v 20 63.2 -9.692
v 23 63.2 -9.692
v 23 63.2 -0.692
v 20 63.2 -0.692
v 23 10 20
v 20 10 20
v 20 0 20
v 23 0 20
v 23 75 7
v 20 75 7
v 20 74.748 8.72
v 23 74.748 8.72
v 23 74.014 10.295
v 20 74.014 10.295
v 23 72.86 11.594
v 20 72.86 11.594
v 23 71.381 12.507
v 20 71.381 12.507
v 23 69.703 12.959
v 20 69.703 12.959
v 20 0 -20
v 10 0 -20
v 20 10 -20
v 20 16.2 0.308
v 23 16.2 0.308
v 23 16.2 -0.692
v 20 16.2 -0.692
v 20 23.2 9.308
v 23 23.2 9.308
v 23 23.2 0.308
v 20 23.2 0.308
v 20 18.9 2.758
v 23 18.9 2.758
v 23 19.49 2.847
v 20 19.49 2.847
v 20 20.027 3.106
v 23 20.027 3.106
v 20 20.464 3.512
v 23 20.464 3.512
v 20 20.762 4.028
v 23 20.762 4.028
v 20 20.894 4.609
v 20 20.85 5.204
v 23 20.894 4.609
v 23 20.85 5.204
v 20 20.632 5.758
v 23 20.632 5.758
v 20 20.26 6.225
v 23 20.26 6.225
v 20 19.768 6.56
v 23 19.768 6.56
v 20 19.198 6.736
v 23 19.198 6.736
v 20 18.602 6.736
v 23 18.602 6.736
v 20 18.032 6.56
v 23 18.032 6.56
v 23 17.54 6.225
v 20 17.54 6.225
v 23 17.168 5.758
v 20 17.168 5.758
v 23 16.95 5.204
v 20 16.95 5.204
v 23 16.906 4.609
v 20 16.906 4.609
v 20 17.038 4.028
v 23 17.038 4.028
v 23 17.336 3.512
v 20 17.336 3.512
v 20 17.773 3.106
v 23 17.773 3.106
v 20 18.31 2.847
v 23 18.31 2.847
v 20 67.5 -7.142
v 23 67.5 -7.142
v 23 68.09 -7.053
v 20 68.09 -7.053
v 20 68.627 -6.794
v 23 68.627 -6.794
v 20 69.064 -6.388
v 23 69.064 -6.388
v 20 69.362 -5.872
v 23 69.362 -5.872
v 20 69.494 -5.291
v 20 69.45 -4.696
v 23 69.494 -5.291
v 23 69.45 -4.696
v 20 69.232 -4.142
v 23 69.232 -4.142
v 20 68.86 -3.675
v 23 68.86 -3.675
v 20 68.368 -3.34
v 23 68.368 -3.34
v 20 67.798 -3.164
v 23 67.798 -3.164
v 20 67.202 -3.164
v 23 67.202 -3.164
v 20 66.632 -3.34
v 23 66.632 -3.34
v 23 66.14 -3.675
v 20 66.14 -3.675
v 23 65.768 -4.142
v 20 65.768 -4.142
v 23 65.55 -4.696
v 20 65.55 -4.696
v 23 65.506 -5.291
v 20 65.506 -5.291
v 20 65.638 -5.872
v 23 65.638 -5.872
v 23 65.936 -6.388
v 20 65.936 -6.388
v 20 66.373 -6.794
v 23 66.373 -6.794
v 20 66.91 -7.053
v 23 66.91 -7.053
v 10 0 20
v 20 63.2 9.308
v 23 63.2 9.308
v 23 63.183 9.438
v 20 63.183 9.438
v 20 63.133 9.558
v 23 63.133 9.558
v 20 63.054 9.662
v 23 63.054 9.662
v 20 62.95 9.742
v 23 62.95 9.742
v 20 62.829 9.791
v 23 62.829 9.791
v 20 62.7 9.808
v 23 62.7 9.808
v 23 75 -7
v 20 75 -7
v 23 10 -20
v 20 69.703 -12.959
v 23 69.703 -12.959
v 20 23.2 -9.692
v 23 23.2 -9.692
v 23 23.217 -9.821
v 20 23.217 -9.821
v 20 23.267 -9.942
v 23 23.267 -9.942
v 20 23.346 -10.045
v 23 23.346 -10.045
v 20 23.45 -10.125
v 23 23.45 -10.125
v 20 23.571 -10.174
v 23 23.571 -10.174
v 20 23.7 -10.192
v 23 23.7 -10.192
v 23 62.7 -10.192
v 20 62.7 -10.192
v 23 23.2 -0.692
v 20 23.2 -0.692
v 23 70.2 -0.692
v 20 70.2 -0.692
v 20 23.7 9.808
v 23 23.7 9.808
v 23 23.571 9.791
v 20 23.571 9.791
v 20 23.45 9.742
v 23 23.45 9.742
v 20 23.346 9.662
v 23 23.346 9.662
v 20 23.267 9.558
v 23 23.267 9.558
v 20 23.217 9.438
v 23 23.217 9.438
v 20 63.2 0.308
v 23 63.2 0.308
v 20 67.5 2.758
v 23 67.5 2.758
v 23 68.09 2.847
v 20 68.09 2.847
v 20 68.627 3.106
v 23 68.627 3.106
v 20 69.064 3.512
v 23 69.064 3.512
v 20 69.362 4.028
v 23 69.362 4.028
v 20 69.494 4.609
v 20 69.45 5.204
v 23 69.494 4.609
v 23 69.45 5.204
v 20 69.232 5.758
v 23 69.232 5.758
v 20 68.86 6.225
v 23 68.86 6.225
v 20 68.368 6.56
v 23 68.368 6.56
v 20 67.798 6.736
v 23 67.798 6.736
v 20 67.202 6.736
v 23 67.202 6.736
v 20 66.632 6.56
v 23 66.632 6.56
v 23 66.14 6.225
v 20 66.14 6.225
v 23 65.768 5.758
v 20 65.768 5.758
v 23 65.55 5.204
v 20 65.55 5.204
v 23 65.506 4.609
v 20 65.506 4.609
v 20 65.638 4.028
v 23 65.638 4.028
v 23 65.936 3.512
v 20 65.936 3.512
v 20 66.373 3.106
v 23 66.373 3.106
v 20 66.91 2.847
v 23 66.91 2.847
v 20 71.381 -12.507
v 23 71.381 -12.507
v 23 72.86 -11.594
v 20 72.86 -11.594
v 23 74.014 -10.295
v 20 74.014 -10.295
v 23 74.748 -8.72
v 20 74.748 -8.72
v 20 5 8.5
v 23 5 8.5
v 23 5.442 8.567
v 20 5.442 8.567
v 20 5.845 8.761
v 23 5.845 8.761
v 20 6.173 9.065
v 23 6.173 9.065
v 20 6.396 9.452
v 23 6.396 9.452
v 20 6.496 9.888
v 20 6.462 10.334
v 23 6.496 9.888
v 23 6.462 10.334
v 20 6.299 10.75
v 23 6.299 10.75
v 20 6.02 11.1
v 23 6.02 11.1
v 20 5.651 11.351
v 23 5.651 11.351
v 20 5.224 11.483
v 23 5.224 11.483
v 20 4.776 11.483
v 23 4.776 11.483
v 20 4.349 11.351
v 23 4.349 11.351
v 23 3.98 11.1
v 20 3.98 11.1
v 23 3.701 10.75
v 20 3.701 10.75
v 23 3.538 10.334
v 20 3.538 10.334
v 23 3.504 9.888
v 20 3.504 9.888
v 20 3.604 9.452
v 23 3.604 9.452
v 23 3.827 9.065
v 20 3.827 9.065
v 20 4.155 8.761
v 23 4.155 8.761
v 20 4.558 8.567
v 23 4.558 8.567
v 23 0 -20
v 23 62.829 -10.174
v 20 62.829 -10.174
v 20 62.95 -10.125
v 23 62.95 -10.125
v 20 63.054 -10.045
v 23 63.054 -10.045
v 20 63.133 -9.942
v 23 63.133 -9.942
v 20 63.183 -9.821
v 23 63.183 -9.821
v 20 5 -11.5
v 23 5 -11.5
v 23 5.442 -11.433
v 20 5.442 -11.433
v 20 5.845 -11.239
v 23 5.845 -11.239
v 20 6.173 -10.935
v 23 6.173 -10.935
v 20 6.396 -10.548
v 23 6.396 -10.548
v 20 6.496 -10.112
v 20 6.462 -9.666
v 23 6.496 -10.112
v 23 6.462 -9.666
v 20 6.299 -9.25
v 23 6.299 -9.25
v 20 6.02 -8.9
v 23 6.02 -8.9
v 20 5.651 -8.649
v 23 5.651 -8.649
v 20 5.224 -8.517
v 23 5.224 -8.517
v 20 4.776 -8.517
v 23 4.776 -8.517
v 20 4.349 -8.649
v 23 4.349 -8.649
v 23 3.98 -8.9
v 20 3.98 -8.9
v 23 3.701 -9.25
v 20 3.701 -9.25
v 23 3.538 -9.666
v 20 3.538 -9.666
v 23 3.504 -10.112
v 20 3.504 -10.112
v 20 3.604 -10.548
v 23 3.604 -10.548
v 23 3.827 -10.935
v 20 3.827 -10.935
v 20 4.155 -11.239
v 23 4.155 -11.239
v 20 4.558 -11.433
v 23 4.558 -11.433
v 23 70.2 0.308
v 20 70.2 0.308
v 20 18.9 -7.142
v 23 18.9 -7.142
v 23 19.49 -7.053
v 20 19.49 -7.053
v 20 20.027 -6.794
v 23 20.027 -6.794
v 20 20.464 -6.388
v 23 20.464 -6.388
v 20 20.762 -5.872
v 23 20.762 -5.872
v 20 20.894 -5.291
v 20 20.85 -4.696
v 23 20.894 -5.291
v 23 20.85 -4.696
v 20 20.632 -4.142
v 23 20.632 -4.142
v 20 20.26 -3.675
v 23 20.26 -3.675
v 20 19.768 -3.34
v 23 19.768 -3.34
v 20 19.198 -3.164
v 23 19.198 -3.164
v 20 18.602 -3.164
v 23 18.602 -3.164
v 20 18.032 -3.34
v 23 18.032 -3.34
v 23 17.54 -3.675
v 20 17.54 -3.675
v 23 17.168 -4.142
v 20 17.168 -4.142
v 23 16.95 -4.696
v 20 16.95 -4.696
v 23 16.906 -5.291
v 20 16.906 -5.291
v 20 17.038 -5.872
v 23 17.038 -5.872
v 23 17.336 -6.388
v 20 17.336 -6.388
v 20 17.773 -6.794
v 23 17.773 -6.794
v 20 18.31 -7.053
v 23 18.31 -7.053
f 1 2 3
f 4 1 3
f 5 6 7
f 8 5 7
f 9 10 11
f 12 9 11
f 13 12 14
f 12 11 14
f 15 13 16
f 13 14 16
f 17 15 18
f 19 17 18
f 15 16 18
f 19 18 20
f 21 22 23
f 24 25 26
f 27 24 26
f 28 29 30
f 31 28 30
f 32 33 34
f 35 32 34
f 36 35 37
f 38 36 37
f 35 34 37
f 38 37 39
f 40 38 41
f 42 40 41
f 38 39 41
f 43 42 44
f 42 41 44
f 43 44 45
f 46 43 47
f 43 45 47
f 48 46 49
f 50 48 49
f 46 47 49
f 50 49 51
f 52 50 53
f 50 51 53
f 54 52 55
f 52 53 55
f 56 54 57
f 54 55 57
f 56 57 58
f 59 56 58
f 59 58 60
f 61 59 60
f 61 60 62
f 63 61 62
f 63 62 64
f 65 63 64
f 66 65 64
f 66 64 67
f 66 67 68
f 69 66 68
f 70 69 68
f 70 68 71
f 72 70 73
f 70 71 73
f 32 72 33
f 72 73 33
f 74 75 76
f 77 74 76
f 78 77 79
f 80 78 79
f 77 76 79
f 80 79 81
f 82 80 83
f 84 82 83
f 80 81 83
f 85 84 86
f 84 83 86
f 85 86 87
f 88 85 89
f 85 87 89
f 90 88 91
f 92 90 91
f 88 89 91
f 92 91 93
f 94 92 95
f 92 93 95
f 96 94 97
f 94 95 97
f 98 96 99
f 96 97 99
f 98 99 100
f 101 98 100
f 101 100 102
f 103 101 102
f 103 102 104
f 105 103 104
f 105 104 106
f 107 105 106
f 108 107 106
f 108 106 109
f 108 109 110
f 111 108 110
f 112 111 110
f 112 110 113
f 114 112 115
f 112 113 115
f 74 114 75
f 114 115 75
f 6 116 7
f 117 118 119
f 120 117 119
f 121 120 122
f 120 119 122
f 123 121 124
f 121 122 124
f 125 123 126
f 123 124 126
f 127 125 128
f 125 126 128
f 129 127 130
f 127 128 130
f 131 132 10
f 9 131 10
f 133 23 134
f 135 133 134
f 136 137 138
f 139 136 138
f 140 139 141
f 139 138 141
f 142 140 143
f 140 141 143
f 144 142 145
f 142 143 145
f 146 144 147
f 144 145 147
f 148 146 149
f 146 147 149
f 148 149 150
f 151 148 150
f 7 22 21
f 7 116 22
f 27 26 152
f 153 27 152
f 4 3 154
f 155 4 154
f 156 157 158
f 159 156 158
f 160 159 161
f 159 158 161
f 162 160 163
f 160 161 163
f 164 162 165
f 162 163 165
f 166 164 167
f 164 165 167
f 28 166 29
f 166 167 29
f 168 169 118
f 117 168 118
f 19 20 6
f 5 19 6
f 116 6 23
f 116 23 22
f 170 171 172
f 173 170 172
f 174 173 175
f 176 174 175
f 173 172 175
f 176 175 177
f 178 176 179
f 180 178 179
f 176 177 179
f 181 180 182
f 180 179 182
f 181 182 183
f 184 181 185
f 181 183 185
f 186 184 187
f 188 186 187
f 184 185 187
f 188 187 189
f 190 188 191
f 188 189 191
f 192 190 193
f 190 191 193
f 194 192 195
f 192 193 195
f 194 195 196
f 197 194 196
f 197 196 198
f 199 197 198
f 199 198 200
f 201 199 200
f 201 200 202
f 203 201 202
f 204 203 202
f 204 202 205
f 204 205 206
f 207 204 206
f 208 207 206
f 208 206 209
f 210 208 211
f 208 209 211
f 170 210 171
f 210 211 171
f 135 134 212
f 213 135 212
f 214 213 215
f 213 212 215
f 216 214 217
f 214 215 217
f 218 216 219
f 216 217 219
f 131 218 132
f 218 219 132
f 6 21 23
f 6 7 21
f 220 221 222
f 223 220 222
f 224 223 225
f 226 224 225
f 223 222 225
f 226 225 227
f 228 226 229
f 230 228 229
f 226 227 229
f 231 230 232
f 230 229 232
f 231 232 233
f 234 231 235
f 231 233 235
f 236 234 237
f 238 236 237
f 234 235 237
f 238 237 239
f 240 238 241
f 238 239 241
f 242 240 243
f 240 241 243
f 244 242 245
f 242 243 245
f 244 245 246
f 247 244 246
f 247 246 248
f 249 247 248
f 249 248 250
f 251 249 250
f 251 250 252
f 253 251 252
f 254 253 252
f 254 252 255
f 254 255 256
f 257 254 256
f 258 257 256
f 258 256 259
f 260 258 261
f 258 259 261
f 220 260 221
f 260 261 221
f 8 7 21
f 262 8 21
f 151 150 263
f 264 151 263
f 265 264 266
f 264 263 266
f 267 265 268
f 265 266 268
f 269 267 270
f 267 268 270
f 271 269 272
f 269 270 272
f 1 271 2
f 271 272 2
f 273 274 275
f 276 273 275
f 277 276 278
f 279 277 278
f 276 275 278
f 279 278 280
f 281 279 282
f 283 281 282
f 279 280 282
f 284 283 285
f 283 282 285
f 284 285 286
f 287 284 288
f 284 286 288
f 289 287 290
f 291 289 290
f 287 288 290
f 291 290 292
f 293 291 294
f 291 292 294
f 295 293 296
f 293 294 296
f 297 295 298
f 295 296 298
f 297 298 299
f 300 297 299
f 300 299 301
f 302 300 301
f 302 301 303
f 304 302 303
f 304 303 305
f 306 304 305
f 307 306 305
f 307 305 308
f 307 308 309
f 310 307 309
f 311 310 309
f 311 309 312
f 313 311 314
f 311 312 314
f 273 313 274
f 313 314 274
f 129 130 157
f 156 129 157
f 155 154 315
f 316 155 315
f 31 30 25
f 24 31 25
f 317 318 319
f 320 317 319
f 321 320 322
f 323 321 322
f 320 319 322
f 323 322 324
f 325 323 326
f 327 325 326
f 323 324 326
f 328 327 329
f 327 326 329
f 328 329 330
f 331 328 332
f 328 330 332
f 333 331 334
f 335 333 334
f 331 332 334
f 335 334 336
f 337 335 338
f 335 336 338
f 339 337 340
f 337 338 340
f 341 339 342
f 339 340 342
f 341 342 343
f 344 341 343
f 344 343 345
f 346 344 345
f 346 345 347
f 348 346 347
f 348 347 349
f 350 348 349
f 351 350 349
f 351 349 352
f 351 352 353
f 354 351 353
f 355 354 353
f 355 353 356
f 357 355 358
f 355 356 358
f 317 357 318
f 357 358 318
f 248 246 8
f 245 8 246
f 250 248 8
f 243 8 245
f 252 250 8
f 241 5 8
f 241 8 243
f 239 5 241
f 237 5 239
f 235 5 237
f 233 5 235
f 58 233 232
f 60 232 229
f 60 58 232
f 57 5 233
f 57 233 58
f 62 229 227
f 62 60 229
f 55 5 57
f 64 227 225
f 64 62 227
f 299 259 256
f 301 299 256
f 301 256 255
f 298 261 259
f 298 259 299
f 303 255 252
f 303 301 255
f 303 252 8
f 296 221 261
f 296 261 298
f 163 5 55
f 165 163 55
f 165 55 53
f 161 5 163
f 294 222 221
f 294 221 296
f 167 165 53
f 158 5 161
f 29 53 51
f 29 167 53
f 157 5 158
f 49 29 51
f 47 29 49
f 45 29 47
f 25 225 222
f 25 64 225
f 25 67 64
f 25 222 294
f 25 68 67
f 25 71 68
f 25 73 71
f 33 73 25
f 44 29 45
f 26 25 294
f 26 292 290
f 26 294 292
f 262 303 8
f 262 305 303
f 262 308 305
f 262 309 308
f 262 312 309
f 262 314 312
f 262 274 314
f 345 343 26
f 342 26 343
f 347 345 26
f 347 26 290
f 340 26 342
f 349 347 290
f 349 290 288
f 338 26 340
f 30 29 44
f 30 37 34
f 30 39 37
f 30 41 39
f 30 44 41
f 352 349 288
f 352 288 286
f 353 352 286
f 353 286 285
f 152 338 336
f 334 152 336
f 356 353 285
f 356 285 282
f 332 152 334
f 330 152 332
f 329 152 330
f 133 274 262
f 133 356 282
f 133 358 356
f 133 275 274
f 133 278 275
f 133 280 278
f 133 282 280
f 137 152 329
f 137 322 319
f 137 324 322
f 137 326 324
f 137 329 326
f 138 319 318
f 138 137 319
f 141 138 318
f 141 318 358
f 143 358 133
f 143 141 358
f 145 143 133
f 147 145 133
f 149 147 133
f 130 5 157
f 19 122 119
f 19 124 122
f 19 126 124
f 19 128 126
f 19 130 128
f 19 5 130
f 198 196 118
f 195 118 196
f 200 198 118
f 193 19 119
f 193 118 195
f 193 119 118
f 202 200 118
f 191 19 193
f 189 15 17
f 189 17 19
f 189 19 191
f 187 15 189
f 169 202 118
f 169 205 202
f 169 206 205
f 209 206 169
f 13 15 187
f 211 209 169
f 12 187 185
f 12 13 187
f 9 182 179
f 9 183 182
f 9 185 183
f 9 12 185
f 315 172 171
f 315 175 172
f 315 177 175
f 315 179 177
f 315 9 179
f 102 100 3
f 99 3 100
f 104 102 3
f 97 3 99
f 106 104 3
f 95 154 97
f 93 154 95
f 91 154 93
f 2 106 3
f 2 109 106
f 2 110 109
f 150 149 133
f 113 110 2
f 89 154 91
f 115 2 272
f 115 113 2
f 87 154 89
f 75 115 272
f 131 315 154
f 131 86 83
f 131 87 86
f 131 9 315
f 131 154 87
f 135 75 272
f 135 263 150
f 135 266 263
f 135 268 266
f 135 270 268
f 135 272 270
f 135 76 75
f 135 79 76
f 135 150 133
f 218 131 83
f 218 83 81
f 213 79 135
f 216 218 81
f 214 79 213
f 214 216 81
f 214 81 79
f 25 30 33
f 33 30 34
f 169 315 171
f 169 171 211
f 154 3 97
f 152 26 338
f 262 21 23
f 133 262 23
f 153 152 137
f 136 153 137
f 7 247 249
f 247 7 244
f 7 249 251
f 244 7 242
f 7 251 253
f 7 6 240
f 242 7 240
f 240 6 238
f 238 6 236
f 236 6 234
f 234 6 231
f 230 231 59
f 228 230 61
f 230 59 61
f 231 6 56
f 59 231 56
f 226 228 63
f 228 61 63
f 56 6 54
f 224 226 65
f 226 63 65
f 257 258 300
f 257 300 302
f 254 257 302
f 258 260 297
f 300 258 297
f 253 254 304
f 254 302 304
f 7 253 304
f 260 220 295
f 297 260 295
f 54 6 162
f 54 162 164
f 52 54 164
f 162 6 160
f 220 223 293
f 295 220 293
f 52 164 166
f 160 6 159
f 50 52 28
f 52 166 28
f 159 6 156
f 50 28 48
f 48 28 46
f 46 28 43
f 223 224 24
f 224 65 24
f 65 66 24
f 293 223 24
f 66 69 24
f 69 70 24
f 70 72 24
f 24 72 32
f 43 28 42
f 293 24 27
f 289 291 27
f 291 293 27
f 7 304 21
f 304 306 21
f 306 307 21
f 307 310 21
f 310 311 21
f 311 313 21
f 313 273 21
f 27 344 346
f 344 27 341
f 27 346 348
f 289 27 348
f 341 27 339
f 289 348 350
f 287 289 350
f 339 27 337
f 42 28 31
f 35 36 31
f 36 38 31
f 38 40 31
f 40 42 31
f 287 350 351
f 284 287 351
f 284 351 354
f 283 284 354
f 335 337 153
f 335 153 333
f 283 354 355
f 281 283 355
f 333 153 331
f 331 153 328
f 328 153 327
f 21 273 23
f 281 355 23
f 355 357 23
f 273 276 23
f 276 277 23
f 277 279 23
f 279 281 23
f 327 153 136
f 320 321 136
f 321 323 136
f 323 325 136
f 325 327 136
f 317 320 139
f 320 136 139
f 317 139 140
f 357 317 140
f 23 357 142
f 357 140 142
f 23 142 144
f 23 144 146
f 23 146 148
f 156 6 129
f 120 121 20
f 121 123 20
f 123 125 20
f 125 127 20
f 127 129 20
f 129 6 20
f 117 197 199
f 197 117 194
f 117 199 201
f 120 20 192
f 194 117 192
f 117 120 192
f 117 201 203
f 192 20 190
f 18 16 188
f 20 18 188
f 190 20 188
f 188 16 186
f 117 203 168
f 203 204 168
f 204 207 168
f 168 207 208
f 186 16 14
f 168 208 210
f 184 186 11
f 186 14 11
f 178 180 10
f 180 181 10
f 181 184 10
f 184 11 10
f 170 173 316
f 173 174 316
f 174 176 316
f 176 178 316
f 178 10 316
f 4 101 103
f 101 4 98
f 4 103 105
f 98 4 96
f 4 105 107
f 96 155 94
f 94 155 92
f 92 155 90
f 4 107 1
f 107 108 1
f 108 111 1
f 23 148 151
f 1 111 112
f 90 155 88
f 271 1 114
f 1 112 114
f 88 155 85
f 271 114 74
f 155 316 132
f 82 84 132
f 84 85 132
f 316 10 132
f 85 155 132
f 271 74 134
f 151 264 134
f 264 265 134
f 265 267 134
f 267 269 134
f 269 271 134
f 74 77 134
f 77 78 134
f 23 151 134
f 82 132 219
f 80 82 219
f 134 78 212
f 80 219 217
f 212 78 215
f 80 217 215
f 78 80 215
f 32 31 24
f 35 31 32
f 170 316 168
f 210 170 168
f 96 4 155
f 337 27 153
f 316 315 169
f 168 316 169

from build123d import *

# Parameters (mm, degrees)
BOSS_EXTRUDE1_DEPTH = 20
BOSS_EXTRUDE2_DEPTH = 3
SKETCH4_R           = 2
CUT_EXTRUDE1_DEPTH  = 3
SKETCH5_R           = 1.5
CUT_EXTRUDE2_DEPTH  = 3


with BuildPart() as part:
    # Sketch1 → Boss-Extrude1 (new, symmetric)
    with BuildSketch(Plane.XY):
        Polygon((20, 0), (20, 10), (10, 0), align=None)
    extrude(amount=BOSS_EXTRUDE1_DEPTH, both=True)


with BuildPart() as body_2:
    # Sketch2 → Boss-Extrude2 (new body)
    with BuildSketch(Plane(origin=(20, 0, 0), x_dir=(0, 0, -1), z_dir=(1, 0, 0))):
        with BuildLine():
            Line((20, 10), (12.958701349, 69.702764704))
            ThreePointArc((12.958701349, 69.702764704), (10.986440253, 73.484227259), (7, 75))
            Line((7, 75), (-7, 75))
            ThreePointArc((-7, 75), (-10.986440253, 73.484227259), (-12.958701349, 69.702764704))
            Line((-12.958701349, 69.702764704), (-20, 10))
            Line((-20, 10), (-20, 0))
            Line((-20, 0), (20, 0))
            Line((20, 0), (20, 10))
        make_face()
    extrude(amount=BOSS_EXTRUDE2_DEPTH)

    # Sketch4 → Cut-Extrude1 (cut)
    with BuildSketch(Plane(origin=(23, 0, 0), x_dir=(0, 0, -1), z_dir=(1, 0, 0))):
        with Locations((5.141504709, 67.5)):
            Circle(SKETCH4_R)
        with Locations((-4.758495291, 67.5)):
            Circle(SKETCH4_R)
        with Locations((5.141504709, 18.9)):
            Circle(SKETCH4_R)
        with Locations((-4.758495291, 18.9)):
            Circle(SKETCH4_R)
        with BuildLine():
            Line((-0.308495291, 23.2), (-0.308495291, 16.2))
            Line((-0.308495291, 16.2), (0.691504709, 16.2))
            Line((0.691504709, 16.2), (0.691504709, 23.2))
            Line((0.691504709, 23.2), (9.441504709, 23.2))
            Line((9.441504709, 23.2), (9.691504709, 23.2))
            ThreePointArc((9.691504709, 23.2), (10.0450581, 23.346446609), (10.191504709, 23.7))
            Line((10.191504709, 23.7), (10.191504709, 62.7))
            ThreePointArc((10.191504709, 62.7), (10.0450581, 63.053553391), (9.691504709, 63.2))
            Line((9.691504709, 63.2), (9.441504709, 63.2))
            Line((9.441504709, 63.2), (0.691504709, 63.2))
            Line((0.691504709, 63.2), (0.691504709, 70.2))
            Line((0.691504709, 70.2), (-0.308495291, 70.2))
            Line((-0.308495291, 70.2), (-0.308495291, 63.2))
            Line((-0.308495291, 63.2), (-9.058495291, 63.2))
            Line((-9.058495291, 63.2), (-9.308495291, 63.2))
            ThreePointArc((-9.308495291, 63.2), (-9.662048682, 63.053553391), (-9.808495291, 62.7))
            Line((-9.808495291, 62.7), (-9.808495291, 23.7))
            ThreePointArc((-9.808495291, 23.7), (-9.662048682, 23.346446609), (-9.308495291, 23.2))
            Line((-9.308495291, 23.2), (-9.058495291, 23.2))
            Line((-9.058495291, 23.2), (-0.308495291, 23.2))
        make_face()
    extrude(amount=-CUT_EXTRUDE1_DEPTH, mode=Mode.SUBTRACT)

    # Sketch5 → Cut-Extrude2 (cut)
    with BuildSketch(Plane(origin=(23, 0, 0), x_dir=(0, 0, -1), z_dir=(1, 0, 0))):
        with Locations((10, 5)):
            Circle(SKETCH5_R)
        with Locations((-10, 5)):
            Circle(SKETCH5_R)
    extrude(amount=-CUT_EXTRUDE2_DEPTH, mode=Mode.SUBTRACT)


solid = Compound([part.part, body_2.part])
